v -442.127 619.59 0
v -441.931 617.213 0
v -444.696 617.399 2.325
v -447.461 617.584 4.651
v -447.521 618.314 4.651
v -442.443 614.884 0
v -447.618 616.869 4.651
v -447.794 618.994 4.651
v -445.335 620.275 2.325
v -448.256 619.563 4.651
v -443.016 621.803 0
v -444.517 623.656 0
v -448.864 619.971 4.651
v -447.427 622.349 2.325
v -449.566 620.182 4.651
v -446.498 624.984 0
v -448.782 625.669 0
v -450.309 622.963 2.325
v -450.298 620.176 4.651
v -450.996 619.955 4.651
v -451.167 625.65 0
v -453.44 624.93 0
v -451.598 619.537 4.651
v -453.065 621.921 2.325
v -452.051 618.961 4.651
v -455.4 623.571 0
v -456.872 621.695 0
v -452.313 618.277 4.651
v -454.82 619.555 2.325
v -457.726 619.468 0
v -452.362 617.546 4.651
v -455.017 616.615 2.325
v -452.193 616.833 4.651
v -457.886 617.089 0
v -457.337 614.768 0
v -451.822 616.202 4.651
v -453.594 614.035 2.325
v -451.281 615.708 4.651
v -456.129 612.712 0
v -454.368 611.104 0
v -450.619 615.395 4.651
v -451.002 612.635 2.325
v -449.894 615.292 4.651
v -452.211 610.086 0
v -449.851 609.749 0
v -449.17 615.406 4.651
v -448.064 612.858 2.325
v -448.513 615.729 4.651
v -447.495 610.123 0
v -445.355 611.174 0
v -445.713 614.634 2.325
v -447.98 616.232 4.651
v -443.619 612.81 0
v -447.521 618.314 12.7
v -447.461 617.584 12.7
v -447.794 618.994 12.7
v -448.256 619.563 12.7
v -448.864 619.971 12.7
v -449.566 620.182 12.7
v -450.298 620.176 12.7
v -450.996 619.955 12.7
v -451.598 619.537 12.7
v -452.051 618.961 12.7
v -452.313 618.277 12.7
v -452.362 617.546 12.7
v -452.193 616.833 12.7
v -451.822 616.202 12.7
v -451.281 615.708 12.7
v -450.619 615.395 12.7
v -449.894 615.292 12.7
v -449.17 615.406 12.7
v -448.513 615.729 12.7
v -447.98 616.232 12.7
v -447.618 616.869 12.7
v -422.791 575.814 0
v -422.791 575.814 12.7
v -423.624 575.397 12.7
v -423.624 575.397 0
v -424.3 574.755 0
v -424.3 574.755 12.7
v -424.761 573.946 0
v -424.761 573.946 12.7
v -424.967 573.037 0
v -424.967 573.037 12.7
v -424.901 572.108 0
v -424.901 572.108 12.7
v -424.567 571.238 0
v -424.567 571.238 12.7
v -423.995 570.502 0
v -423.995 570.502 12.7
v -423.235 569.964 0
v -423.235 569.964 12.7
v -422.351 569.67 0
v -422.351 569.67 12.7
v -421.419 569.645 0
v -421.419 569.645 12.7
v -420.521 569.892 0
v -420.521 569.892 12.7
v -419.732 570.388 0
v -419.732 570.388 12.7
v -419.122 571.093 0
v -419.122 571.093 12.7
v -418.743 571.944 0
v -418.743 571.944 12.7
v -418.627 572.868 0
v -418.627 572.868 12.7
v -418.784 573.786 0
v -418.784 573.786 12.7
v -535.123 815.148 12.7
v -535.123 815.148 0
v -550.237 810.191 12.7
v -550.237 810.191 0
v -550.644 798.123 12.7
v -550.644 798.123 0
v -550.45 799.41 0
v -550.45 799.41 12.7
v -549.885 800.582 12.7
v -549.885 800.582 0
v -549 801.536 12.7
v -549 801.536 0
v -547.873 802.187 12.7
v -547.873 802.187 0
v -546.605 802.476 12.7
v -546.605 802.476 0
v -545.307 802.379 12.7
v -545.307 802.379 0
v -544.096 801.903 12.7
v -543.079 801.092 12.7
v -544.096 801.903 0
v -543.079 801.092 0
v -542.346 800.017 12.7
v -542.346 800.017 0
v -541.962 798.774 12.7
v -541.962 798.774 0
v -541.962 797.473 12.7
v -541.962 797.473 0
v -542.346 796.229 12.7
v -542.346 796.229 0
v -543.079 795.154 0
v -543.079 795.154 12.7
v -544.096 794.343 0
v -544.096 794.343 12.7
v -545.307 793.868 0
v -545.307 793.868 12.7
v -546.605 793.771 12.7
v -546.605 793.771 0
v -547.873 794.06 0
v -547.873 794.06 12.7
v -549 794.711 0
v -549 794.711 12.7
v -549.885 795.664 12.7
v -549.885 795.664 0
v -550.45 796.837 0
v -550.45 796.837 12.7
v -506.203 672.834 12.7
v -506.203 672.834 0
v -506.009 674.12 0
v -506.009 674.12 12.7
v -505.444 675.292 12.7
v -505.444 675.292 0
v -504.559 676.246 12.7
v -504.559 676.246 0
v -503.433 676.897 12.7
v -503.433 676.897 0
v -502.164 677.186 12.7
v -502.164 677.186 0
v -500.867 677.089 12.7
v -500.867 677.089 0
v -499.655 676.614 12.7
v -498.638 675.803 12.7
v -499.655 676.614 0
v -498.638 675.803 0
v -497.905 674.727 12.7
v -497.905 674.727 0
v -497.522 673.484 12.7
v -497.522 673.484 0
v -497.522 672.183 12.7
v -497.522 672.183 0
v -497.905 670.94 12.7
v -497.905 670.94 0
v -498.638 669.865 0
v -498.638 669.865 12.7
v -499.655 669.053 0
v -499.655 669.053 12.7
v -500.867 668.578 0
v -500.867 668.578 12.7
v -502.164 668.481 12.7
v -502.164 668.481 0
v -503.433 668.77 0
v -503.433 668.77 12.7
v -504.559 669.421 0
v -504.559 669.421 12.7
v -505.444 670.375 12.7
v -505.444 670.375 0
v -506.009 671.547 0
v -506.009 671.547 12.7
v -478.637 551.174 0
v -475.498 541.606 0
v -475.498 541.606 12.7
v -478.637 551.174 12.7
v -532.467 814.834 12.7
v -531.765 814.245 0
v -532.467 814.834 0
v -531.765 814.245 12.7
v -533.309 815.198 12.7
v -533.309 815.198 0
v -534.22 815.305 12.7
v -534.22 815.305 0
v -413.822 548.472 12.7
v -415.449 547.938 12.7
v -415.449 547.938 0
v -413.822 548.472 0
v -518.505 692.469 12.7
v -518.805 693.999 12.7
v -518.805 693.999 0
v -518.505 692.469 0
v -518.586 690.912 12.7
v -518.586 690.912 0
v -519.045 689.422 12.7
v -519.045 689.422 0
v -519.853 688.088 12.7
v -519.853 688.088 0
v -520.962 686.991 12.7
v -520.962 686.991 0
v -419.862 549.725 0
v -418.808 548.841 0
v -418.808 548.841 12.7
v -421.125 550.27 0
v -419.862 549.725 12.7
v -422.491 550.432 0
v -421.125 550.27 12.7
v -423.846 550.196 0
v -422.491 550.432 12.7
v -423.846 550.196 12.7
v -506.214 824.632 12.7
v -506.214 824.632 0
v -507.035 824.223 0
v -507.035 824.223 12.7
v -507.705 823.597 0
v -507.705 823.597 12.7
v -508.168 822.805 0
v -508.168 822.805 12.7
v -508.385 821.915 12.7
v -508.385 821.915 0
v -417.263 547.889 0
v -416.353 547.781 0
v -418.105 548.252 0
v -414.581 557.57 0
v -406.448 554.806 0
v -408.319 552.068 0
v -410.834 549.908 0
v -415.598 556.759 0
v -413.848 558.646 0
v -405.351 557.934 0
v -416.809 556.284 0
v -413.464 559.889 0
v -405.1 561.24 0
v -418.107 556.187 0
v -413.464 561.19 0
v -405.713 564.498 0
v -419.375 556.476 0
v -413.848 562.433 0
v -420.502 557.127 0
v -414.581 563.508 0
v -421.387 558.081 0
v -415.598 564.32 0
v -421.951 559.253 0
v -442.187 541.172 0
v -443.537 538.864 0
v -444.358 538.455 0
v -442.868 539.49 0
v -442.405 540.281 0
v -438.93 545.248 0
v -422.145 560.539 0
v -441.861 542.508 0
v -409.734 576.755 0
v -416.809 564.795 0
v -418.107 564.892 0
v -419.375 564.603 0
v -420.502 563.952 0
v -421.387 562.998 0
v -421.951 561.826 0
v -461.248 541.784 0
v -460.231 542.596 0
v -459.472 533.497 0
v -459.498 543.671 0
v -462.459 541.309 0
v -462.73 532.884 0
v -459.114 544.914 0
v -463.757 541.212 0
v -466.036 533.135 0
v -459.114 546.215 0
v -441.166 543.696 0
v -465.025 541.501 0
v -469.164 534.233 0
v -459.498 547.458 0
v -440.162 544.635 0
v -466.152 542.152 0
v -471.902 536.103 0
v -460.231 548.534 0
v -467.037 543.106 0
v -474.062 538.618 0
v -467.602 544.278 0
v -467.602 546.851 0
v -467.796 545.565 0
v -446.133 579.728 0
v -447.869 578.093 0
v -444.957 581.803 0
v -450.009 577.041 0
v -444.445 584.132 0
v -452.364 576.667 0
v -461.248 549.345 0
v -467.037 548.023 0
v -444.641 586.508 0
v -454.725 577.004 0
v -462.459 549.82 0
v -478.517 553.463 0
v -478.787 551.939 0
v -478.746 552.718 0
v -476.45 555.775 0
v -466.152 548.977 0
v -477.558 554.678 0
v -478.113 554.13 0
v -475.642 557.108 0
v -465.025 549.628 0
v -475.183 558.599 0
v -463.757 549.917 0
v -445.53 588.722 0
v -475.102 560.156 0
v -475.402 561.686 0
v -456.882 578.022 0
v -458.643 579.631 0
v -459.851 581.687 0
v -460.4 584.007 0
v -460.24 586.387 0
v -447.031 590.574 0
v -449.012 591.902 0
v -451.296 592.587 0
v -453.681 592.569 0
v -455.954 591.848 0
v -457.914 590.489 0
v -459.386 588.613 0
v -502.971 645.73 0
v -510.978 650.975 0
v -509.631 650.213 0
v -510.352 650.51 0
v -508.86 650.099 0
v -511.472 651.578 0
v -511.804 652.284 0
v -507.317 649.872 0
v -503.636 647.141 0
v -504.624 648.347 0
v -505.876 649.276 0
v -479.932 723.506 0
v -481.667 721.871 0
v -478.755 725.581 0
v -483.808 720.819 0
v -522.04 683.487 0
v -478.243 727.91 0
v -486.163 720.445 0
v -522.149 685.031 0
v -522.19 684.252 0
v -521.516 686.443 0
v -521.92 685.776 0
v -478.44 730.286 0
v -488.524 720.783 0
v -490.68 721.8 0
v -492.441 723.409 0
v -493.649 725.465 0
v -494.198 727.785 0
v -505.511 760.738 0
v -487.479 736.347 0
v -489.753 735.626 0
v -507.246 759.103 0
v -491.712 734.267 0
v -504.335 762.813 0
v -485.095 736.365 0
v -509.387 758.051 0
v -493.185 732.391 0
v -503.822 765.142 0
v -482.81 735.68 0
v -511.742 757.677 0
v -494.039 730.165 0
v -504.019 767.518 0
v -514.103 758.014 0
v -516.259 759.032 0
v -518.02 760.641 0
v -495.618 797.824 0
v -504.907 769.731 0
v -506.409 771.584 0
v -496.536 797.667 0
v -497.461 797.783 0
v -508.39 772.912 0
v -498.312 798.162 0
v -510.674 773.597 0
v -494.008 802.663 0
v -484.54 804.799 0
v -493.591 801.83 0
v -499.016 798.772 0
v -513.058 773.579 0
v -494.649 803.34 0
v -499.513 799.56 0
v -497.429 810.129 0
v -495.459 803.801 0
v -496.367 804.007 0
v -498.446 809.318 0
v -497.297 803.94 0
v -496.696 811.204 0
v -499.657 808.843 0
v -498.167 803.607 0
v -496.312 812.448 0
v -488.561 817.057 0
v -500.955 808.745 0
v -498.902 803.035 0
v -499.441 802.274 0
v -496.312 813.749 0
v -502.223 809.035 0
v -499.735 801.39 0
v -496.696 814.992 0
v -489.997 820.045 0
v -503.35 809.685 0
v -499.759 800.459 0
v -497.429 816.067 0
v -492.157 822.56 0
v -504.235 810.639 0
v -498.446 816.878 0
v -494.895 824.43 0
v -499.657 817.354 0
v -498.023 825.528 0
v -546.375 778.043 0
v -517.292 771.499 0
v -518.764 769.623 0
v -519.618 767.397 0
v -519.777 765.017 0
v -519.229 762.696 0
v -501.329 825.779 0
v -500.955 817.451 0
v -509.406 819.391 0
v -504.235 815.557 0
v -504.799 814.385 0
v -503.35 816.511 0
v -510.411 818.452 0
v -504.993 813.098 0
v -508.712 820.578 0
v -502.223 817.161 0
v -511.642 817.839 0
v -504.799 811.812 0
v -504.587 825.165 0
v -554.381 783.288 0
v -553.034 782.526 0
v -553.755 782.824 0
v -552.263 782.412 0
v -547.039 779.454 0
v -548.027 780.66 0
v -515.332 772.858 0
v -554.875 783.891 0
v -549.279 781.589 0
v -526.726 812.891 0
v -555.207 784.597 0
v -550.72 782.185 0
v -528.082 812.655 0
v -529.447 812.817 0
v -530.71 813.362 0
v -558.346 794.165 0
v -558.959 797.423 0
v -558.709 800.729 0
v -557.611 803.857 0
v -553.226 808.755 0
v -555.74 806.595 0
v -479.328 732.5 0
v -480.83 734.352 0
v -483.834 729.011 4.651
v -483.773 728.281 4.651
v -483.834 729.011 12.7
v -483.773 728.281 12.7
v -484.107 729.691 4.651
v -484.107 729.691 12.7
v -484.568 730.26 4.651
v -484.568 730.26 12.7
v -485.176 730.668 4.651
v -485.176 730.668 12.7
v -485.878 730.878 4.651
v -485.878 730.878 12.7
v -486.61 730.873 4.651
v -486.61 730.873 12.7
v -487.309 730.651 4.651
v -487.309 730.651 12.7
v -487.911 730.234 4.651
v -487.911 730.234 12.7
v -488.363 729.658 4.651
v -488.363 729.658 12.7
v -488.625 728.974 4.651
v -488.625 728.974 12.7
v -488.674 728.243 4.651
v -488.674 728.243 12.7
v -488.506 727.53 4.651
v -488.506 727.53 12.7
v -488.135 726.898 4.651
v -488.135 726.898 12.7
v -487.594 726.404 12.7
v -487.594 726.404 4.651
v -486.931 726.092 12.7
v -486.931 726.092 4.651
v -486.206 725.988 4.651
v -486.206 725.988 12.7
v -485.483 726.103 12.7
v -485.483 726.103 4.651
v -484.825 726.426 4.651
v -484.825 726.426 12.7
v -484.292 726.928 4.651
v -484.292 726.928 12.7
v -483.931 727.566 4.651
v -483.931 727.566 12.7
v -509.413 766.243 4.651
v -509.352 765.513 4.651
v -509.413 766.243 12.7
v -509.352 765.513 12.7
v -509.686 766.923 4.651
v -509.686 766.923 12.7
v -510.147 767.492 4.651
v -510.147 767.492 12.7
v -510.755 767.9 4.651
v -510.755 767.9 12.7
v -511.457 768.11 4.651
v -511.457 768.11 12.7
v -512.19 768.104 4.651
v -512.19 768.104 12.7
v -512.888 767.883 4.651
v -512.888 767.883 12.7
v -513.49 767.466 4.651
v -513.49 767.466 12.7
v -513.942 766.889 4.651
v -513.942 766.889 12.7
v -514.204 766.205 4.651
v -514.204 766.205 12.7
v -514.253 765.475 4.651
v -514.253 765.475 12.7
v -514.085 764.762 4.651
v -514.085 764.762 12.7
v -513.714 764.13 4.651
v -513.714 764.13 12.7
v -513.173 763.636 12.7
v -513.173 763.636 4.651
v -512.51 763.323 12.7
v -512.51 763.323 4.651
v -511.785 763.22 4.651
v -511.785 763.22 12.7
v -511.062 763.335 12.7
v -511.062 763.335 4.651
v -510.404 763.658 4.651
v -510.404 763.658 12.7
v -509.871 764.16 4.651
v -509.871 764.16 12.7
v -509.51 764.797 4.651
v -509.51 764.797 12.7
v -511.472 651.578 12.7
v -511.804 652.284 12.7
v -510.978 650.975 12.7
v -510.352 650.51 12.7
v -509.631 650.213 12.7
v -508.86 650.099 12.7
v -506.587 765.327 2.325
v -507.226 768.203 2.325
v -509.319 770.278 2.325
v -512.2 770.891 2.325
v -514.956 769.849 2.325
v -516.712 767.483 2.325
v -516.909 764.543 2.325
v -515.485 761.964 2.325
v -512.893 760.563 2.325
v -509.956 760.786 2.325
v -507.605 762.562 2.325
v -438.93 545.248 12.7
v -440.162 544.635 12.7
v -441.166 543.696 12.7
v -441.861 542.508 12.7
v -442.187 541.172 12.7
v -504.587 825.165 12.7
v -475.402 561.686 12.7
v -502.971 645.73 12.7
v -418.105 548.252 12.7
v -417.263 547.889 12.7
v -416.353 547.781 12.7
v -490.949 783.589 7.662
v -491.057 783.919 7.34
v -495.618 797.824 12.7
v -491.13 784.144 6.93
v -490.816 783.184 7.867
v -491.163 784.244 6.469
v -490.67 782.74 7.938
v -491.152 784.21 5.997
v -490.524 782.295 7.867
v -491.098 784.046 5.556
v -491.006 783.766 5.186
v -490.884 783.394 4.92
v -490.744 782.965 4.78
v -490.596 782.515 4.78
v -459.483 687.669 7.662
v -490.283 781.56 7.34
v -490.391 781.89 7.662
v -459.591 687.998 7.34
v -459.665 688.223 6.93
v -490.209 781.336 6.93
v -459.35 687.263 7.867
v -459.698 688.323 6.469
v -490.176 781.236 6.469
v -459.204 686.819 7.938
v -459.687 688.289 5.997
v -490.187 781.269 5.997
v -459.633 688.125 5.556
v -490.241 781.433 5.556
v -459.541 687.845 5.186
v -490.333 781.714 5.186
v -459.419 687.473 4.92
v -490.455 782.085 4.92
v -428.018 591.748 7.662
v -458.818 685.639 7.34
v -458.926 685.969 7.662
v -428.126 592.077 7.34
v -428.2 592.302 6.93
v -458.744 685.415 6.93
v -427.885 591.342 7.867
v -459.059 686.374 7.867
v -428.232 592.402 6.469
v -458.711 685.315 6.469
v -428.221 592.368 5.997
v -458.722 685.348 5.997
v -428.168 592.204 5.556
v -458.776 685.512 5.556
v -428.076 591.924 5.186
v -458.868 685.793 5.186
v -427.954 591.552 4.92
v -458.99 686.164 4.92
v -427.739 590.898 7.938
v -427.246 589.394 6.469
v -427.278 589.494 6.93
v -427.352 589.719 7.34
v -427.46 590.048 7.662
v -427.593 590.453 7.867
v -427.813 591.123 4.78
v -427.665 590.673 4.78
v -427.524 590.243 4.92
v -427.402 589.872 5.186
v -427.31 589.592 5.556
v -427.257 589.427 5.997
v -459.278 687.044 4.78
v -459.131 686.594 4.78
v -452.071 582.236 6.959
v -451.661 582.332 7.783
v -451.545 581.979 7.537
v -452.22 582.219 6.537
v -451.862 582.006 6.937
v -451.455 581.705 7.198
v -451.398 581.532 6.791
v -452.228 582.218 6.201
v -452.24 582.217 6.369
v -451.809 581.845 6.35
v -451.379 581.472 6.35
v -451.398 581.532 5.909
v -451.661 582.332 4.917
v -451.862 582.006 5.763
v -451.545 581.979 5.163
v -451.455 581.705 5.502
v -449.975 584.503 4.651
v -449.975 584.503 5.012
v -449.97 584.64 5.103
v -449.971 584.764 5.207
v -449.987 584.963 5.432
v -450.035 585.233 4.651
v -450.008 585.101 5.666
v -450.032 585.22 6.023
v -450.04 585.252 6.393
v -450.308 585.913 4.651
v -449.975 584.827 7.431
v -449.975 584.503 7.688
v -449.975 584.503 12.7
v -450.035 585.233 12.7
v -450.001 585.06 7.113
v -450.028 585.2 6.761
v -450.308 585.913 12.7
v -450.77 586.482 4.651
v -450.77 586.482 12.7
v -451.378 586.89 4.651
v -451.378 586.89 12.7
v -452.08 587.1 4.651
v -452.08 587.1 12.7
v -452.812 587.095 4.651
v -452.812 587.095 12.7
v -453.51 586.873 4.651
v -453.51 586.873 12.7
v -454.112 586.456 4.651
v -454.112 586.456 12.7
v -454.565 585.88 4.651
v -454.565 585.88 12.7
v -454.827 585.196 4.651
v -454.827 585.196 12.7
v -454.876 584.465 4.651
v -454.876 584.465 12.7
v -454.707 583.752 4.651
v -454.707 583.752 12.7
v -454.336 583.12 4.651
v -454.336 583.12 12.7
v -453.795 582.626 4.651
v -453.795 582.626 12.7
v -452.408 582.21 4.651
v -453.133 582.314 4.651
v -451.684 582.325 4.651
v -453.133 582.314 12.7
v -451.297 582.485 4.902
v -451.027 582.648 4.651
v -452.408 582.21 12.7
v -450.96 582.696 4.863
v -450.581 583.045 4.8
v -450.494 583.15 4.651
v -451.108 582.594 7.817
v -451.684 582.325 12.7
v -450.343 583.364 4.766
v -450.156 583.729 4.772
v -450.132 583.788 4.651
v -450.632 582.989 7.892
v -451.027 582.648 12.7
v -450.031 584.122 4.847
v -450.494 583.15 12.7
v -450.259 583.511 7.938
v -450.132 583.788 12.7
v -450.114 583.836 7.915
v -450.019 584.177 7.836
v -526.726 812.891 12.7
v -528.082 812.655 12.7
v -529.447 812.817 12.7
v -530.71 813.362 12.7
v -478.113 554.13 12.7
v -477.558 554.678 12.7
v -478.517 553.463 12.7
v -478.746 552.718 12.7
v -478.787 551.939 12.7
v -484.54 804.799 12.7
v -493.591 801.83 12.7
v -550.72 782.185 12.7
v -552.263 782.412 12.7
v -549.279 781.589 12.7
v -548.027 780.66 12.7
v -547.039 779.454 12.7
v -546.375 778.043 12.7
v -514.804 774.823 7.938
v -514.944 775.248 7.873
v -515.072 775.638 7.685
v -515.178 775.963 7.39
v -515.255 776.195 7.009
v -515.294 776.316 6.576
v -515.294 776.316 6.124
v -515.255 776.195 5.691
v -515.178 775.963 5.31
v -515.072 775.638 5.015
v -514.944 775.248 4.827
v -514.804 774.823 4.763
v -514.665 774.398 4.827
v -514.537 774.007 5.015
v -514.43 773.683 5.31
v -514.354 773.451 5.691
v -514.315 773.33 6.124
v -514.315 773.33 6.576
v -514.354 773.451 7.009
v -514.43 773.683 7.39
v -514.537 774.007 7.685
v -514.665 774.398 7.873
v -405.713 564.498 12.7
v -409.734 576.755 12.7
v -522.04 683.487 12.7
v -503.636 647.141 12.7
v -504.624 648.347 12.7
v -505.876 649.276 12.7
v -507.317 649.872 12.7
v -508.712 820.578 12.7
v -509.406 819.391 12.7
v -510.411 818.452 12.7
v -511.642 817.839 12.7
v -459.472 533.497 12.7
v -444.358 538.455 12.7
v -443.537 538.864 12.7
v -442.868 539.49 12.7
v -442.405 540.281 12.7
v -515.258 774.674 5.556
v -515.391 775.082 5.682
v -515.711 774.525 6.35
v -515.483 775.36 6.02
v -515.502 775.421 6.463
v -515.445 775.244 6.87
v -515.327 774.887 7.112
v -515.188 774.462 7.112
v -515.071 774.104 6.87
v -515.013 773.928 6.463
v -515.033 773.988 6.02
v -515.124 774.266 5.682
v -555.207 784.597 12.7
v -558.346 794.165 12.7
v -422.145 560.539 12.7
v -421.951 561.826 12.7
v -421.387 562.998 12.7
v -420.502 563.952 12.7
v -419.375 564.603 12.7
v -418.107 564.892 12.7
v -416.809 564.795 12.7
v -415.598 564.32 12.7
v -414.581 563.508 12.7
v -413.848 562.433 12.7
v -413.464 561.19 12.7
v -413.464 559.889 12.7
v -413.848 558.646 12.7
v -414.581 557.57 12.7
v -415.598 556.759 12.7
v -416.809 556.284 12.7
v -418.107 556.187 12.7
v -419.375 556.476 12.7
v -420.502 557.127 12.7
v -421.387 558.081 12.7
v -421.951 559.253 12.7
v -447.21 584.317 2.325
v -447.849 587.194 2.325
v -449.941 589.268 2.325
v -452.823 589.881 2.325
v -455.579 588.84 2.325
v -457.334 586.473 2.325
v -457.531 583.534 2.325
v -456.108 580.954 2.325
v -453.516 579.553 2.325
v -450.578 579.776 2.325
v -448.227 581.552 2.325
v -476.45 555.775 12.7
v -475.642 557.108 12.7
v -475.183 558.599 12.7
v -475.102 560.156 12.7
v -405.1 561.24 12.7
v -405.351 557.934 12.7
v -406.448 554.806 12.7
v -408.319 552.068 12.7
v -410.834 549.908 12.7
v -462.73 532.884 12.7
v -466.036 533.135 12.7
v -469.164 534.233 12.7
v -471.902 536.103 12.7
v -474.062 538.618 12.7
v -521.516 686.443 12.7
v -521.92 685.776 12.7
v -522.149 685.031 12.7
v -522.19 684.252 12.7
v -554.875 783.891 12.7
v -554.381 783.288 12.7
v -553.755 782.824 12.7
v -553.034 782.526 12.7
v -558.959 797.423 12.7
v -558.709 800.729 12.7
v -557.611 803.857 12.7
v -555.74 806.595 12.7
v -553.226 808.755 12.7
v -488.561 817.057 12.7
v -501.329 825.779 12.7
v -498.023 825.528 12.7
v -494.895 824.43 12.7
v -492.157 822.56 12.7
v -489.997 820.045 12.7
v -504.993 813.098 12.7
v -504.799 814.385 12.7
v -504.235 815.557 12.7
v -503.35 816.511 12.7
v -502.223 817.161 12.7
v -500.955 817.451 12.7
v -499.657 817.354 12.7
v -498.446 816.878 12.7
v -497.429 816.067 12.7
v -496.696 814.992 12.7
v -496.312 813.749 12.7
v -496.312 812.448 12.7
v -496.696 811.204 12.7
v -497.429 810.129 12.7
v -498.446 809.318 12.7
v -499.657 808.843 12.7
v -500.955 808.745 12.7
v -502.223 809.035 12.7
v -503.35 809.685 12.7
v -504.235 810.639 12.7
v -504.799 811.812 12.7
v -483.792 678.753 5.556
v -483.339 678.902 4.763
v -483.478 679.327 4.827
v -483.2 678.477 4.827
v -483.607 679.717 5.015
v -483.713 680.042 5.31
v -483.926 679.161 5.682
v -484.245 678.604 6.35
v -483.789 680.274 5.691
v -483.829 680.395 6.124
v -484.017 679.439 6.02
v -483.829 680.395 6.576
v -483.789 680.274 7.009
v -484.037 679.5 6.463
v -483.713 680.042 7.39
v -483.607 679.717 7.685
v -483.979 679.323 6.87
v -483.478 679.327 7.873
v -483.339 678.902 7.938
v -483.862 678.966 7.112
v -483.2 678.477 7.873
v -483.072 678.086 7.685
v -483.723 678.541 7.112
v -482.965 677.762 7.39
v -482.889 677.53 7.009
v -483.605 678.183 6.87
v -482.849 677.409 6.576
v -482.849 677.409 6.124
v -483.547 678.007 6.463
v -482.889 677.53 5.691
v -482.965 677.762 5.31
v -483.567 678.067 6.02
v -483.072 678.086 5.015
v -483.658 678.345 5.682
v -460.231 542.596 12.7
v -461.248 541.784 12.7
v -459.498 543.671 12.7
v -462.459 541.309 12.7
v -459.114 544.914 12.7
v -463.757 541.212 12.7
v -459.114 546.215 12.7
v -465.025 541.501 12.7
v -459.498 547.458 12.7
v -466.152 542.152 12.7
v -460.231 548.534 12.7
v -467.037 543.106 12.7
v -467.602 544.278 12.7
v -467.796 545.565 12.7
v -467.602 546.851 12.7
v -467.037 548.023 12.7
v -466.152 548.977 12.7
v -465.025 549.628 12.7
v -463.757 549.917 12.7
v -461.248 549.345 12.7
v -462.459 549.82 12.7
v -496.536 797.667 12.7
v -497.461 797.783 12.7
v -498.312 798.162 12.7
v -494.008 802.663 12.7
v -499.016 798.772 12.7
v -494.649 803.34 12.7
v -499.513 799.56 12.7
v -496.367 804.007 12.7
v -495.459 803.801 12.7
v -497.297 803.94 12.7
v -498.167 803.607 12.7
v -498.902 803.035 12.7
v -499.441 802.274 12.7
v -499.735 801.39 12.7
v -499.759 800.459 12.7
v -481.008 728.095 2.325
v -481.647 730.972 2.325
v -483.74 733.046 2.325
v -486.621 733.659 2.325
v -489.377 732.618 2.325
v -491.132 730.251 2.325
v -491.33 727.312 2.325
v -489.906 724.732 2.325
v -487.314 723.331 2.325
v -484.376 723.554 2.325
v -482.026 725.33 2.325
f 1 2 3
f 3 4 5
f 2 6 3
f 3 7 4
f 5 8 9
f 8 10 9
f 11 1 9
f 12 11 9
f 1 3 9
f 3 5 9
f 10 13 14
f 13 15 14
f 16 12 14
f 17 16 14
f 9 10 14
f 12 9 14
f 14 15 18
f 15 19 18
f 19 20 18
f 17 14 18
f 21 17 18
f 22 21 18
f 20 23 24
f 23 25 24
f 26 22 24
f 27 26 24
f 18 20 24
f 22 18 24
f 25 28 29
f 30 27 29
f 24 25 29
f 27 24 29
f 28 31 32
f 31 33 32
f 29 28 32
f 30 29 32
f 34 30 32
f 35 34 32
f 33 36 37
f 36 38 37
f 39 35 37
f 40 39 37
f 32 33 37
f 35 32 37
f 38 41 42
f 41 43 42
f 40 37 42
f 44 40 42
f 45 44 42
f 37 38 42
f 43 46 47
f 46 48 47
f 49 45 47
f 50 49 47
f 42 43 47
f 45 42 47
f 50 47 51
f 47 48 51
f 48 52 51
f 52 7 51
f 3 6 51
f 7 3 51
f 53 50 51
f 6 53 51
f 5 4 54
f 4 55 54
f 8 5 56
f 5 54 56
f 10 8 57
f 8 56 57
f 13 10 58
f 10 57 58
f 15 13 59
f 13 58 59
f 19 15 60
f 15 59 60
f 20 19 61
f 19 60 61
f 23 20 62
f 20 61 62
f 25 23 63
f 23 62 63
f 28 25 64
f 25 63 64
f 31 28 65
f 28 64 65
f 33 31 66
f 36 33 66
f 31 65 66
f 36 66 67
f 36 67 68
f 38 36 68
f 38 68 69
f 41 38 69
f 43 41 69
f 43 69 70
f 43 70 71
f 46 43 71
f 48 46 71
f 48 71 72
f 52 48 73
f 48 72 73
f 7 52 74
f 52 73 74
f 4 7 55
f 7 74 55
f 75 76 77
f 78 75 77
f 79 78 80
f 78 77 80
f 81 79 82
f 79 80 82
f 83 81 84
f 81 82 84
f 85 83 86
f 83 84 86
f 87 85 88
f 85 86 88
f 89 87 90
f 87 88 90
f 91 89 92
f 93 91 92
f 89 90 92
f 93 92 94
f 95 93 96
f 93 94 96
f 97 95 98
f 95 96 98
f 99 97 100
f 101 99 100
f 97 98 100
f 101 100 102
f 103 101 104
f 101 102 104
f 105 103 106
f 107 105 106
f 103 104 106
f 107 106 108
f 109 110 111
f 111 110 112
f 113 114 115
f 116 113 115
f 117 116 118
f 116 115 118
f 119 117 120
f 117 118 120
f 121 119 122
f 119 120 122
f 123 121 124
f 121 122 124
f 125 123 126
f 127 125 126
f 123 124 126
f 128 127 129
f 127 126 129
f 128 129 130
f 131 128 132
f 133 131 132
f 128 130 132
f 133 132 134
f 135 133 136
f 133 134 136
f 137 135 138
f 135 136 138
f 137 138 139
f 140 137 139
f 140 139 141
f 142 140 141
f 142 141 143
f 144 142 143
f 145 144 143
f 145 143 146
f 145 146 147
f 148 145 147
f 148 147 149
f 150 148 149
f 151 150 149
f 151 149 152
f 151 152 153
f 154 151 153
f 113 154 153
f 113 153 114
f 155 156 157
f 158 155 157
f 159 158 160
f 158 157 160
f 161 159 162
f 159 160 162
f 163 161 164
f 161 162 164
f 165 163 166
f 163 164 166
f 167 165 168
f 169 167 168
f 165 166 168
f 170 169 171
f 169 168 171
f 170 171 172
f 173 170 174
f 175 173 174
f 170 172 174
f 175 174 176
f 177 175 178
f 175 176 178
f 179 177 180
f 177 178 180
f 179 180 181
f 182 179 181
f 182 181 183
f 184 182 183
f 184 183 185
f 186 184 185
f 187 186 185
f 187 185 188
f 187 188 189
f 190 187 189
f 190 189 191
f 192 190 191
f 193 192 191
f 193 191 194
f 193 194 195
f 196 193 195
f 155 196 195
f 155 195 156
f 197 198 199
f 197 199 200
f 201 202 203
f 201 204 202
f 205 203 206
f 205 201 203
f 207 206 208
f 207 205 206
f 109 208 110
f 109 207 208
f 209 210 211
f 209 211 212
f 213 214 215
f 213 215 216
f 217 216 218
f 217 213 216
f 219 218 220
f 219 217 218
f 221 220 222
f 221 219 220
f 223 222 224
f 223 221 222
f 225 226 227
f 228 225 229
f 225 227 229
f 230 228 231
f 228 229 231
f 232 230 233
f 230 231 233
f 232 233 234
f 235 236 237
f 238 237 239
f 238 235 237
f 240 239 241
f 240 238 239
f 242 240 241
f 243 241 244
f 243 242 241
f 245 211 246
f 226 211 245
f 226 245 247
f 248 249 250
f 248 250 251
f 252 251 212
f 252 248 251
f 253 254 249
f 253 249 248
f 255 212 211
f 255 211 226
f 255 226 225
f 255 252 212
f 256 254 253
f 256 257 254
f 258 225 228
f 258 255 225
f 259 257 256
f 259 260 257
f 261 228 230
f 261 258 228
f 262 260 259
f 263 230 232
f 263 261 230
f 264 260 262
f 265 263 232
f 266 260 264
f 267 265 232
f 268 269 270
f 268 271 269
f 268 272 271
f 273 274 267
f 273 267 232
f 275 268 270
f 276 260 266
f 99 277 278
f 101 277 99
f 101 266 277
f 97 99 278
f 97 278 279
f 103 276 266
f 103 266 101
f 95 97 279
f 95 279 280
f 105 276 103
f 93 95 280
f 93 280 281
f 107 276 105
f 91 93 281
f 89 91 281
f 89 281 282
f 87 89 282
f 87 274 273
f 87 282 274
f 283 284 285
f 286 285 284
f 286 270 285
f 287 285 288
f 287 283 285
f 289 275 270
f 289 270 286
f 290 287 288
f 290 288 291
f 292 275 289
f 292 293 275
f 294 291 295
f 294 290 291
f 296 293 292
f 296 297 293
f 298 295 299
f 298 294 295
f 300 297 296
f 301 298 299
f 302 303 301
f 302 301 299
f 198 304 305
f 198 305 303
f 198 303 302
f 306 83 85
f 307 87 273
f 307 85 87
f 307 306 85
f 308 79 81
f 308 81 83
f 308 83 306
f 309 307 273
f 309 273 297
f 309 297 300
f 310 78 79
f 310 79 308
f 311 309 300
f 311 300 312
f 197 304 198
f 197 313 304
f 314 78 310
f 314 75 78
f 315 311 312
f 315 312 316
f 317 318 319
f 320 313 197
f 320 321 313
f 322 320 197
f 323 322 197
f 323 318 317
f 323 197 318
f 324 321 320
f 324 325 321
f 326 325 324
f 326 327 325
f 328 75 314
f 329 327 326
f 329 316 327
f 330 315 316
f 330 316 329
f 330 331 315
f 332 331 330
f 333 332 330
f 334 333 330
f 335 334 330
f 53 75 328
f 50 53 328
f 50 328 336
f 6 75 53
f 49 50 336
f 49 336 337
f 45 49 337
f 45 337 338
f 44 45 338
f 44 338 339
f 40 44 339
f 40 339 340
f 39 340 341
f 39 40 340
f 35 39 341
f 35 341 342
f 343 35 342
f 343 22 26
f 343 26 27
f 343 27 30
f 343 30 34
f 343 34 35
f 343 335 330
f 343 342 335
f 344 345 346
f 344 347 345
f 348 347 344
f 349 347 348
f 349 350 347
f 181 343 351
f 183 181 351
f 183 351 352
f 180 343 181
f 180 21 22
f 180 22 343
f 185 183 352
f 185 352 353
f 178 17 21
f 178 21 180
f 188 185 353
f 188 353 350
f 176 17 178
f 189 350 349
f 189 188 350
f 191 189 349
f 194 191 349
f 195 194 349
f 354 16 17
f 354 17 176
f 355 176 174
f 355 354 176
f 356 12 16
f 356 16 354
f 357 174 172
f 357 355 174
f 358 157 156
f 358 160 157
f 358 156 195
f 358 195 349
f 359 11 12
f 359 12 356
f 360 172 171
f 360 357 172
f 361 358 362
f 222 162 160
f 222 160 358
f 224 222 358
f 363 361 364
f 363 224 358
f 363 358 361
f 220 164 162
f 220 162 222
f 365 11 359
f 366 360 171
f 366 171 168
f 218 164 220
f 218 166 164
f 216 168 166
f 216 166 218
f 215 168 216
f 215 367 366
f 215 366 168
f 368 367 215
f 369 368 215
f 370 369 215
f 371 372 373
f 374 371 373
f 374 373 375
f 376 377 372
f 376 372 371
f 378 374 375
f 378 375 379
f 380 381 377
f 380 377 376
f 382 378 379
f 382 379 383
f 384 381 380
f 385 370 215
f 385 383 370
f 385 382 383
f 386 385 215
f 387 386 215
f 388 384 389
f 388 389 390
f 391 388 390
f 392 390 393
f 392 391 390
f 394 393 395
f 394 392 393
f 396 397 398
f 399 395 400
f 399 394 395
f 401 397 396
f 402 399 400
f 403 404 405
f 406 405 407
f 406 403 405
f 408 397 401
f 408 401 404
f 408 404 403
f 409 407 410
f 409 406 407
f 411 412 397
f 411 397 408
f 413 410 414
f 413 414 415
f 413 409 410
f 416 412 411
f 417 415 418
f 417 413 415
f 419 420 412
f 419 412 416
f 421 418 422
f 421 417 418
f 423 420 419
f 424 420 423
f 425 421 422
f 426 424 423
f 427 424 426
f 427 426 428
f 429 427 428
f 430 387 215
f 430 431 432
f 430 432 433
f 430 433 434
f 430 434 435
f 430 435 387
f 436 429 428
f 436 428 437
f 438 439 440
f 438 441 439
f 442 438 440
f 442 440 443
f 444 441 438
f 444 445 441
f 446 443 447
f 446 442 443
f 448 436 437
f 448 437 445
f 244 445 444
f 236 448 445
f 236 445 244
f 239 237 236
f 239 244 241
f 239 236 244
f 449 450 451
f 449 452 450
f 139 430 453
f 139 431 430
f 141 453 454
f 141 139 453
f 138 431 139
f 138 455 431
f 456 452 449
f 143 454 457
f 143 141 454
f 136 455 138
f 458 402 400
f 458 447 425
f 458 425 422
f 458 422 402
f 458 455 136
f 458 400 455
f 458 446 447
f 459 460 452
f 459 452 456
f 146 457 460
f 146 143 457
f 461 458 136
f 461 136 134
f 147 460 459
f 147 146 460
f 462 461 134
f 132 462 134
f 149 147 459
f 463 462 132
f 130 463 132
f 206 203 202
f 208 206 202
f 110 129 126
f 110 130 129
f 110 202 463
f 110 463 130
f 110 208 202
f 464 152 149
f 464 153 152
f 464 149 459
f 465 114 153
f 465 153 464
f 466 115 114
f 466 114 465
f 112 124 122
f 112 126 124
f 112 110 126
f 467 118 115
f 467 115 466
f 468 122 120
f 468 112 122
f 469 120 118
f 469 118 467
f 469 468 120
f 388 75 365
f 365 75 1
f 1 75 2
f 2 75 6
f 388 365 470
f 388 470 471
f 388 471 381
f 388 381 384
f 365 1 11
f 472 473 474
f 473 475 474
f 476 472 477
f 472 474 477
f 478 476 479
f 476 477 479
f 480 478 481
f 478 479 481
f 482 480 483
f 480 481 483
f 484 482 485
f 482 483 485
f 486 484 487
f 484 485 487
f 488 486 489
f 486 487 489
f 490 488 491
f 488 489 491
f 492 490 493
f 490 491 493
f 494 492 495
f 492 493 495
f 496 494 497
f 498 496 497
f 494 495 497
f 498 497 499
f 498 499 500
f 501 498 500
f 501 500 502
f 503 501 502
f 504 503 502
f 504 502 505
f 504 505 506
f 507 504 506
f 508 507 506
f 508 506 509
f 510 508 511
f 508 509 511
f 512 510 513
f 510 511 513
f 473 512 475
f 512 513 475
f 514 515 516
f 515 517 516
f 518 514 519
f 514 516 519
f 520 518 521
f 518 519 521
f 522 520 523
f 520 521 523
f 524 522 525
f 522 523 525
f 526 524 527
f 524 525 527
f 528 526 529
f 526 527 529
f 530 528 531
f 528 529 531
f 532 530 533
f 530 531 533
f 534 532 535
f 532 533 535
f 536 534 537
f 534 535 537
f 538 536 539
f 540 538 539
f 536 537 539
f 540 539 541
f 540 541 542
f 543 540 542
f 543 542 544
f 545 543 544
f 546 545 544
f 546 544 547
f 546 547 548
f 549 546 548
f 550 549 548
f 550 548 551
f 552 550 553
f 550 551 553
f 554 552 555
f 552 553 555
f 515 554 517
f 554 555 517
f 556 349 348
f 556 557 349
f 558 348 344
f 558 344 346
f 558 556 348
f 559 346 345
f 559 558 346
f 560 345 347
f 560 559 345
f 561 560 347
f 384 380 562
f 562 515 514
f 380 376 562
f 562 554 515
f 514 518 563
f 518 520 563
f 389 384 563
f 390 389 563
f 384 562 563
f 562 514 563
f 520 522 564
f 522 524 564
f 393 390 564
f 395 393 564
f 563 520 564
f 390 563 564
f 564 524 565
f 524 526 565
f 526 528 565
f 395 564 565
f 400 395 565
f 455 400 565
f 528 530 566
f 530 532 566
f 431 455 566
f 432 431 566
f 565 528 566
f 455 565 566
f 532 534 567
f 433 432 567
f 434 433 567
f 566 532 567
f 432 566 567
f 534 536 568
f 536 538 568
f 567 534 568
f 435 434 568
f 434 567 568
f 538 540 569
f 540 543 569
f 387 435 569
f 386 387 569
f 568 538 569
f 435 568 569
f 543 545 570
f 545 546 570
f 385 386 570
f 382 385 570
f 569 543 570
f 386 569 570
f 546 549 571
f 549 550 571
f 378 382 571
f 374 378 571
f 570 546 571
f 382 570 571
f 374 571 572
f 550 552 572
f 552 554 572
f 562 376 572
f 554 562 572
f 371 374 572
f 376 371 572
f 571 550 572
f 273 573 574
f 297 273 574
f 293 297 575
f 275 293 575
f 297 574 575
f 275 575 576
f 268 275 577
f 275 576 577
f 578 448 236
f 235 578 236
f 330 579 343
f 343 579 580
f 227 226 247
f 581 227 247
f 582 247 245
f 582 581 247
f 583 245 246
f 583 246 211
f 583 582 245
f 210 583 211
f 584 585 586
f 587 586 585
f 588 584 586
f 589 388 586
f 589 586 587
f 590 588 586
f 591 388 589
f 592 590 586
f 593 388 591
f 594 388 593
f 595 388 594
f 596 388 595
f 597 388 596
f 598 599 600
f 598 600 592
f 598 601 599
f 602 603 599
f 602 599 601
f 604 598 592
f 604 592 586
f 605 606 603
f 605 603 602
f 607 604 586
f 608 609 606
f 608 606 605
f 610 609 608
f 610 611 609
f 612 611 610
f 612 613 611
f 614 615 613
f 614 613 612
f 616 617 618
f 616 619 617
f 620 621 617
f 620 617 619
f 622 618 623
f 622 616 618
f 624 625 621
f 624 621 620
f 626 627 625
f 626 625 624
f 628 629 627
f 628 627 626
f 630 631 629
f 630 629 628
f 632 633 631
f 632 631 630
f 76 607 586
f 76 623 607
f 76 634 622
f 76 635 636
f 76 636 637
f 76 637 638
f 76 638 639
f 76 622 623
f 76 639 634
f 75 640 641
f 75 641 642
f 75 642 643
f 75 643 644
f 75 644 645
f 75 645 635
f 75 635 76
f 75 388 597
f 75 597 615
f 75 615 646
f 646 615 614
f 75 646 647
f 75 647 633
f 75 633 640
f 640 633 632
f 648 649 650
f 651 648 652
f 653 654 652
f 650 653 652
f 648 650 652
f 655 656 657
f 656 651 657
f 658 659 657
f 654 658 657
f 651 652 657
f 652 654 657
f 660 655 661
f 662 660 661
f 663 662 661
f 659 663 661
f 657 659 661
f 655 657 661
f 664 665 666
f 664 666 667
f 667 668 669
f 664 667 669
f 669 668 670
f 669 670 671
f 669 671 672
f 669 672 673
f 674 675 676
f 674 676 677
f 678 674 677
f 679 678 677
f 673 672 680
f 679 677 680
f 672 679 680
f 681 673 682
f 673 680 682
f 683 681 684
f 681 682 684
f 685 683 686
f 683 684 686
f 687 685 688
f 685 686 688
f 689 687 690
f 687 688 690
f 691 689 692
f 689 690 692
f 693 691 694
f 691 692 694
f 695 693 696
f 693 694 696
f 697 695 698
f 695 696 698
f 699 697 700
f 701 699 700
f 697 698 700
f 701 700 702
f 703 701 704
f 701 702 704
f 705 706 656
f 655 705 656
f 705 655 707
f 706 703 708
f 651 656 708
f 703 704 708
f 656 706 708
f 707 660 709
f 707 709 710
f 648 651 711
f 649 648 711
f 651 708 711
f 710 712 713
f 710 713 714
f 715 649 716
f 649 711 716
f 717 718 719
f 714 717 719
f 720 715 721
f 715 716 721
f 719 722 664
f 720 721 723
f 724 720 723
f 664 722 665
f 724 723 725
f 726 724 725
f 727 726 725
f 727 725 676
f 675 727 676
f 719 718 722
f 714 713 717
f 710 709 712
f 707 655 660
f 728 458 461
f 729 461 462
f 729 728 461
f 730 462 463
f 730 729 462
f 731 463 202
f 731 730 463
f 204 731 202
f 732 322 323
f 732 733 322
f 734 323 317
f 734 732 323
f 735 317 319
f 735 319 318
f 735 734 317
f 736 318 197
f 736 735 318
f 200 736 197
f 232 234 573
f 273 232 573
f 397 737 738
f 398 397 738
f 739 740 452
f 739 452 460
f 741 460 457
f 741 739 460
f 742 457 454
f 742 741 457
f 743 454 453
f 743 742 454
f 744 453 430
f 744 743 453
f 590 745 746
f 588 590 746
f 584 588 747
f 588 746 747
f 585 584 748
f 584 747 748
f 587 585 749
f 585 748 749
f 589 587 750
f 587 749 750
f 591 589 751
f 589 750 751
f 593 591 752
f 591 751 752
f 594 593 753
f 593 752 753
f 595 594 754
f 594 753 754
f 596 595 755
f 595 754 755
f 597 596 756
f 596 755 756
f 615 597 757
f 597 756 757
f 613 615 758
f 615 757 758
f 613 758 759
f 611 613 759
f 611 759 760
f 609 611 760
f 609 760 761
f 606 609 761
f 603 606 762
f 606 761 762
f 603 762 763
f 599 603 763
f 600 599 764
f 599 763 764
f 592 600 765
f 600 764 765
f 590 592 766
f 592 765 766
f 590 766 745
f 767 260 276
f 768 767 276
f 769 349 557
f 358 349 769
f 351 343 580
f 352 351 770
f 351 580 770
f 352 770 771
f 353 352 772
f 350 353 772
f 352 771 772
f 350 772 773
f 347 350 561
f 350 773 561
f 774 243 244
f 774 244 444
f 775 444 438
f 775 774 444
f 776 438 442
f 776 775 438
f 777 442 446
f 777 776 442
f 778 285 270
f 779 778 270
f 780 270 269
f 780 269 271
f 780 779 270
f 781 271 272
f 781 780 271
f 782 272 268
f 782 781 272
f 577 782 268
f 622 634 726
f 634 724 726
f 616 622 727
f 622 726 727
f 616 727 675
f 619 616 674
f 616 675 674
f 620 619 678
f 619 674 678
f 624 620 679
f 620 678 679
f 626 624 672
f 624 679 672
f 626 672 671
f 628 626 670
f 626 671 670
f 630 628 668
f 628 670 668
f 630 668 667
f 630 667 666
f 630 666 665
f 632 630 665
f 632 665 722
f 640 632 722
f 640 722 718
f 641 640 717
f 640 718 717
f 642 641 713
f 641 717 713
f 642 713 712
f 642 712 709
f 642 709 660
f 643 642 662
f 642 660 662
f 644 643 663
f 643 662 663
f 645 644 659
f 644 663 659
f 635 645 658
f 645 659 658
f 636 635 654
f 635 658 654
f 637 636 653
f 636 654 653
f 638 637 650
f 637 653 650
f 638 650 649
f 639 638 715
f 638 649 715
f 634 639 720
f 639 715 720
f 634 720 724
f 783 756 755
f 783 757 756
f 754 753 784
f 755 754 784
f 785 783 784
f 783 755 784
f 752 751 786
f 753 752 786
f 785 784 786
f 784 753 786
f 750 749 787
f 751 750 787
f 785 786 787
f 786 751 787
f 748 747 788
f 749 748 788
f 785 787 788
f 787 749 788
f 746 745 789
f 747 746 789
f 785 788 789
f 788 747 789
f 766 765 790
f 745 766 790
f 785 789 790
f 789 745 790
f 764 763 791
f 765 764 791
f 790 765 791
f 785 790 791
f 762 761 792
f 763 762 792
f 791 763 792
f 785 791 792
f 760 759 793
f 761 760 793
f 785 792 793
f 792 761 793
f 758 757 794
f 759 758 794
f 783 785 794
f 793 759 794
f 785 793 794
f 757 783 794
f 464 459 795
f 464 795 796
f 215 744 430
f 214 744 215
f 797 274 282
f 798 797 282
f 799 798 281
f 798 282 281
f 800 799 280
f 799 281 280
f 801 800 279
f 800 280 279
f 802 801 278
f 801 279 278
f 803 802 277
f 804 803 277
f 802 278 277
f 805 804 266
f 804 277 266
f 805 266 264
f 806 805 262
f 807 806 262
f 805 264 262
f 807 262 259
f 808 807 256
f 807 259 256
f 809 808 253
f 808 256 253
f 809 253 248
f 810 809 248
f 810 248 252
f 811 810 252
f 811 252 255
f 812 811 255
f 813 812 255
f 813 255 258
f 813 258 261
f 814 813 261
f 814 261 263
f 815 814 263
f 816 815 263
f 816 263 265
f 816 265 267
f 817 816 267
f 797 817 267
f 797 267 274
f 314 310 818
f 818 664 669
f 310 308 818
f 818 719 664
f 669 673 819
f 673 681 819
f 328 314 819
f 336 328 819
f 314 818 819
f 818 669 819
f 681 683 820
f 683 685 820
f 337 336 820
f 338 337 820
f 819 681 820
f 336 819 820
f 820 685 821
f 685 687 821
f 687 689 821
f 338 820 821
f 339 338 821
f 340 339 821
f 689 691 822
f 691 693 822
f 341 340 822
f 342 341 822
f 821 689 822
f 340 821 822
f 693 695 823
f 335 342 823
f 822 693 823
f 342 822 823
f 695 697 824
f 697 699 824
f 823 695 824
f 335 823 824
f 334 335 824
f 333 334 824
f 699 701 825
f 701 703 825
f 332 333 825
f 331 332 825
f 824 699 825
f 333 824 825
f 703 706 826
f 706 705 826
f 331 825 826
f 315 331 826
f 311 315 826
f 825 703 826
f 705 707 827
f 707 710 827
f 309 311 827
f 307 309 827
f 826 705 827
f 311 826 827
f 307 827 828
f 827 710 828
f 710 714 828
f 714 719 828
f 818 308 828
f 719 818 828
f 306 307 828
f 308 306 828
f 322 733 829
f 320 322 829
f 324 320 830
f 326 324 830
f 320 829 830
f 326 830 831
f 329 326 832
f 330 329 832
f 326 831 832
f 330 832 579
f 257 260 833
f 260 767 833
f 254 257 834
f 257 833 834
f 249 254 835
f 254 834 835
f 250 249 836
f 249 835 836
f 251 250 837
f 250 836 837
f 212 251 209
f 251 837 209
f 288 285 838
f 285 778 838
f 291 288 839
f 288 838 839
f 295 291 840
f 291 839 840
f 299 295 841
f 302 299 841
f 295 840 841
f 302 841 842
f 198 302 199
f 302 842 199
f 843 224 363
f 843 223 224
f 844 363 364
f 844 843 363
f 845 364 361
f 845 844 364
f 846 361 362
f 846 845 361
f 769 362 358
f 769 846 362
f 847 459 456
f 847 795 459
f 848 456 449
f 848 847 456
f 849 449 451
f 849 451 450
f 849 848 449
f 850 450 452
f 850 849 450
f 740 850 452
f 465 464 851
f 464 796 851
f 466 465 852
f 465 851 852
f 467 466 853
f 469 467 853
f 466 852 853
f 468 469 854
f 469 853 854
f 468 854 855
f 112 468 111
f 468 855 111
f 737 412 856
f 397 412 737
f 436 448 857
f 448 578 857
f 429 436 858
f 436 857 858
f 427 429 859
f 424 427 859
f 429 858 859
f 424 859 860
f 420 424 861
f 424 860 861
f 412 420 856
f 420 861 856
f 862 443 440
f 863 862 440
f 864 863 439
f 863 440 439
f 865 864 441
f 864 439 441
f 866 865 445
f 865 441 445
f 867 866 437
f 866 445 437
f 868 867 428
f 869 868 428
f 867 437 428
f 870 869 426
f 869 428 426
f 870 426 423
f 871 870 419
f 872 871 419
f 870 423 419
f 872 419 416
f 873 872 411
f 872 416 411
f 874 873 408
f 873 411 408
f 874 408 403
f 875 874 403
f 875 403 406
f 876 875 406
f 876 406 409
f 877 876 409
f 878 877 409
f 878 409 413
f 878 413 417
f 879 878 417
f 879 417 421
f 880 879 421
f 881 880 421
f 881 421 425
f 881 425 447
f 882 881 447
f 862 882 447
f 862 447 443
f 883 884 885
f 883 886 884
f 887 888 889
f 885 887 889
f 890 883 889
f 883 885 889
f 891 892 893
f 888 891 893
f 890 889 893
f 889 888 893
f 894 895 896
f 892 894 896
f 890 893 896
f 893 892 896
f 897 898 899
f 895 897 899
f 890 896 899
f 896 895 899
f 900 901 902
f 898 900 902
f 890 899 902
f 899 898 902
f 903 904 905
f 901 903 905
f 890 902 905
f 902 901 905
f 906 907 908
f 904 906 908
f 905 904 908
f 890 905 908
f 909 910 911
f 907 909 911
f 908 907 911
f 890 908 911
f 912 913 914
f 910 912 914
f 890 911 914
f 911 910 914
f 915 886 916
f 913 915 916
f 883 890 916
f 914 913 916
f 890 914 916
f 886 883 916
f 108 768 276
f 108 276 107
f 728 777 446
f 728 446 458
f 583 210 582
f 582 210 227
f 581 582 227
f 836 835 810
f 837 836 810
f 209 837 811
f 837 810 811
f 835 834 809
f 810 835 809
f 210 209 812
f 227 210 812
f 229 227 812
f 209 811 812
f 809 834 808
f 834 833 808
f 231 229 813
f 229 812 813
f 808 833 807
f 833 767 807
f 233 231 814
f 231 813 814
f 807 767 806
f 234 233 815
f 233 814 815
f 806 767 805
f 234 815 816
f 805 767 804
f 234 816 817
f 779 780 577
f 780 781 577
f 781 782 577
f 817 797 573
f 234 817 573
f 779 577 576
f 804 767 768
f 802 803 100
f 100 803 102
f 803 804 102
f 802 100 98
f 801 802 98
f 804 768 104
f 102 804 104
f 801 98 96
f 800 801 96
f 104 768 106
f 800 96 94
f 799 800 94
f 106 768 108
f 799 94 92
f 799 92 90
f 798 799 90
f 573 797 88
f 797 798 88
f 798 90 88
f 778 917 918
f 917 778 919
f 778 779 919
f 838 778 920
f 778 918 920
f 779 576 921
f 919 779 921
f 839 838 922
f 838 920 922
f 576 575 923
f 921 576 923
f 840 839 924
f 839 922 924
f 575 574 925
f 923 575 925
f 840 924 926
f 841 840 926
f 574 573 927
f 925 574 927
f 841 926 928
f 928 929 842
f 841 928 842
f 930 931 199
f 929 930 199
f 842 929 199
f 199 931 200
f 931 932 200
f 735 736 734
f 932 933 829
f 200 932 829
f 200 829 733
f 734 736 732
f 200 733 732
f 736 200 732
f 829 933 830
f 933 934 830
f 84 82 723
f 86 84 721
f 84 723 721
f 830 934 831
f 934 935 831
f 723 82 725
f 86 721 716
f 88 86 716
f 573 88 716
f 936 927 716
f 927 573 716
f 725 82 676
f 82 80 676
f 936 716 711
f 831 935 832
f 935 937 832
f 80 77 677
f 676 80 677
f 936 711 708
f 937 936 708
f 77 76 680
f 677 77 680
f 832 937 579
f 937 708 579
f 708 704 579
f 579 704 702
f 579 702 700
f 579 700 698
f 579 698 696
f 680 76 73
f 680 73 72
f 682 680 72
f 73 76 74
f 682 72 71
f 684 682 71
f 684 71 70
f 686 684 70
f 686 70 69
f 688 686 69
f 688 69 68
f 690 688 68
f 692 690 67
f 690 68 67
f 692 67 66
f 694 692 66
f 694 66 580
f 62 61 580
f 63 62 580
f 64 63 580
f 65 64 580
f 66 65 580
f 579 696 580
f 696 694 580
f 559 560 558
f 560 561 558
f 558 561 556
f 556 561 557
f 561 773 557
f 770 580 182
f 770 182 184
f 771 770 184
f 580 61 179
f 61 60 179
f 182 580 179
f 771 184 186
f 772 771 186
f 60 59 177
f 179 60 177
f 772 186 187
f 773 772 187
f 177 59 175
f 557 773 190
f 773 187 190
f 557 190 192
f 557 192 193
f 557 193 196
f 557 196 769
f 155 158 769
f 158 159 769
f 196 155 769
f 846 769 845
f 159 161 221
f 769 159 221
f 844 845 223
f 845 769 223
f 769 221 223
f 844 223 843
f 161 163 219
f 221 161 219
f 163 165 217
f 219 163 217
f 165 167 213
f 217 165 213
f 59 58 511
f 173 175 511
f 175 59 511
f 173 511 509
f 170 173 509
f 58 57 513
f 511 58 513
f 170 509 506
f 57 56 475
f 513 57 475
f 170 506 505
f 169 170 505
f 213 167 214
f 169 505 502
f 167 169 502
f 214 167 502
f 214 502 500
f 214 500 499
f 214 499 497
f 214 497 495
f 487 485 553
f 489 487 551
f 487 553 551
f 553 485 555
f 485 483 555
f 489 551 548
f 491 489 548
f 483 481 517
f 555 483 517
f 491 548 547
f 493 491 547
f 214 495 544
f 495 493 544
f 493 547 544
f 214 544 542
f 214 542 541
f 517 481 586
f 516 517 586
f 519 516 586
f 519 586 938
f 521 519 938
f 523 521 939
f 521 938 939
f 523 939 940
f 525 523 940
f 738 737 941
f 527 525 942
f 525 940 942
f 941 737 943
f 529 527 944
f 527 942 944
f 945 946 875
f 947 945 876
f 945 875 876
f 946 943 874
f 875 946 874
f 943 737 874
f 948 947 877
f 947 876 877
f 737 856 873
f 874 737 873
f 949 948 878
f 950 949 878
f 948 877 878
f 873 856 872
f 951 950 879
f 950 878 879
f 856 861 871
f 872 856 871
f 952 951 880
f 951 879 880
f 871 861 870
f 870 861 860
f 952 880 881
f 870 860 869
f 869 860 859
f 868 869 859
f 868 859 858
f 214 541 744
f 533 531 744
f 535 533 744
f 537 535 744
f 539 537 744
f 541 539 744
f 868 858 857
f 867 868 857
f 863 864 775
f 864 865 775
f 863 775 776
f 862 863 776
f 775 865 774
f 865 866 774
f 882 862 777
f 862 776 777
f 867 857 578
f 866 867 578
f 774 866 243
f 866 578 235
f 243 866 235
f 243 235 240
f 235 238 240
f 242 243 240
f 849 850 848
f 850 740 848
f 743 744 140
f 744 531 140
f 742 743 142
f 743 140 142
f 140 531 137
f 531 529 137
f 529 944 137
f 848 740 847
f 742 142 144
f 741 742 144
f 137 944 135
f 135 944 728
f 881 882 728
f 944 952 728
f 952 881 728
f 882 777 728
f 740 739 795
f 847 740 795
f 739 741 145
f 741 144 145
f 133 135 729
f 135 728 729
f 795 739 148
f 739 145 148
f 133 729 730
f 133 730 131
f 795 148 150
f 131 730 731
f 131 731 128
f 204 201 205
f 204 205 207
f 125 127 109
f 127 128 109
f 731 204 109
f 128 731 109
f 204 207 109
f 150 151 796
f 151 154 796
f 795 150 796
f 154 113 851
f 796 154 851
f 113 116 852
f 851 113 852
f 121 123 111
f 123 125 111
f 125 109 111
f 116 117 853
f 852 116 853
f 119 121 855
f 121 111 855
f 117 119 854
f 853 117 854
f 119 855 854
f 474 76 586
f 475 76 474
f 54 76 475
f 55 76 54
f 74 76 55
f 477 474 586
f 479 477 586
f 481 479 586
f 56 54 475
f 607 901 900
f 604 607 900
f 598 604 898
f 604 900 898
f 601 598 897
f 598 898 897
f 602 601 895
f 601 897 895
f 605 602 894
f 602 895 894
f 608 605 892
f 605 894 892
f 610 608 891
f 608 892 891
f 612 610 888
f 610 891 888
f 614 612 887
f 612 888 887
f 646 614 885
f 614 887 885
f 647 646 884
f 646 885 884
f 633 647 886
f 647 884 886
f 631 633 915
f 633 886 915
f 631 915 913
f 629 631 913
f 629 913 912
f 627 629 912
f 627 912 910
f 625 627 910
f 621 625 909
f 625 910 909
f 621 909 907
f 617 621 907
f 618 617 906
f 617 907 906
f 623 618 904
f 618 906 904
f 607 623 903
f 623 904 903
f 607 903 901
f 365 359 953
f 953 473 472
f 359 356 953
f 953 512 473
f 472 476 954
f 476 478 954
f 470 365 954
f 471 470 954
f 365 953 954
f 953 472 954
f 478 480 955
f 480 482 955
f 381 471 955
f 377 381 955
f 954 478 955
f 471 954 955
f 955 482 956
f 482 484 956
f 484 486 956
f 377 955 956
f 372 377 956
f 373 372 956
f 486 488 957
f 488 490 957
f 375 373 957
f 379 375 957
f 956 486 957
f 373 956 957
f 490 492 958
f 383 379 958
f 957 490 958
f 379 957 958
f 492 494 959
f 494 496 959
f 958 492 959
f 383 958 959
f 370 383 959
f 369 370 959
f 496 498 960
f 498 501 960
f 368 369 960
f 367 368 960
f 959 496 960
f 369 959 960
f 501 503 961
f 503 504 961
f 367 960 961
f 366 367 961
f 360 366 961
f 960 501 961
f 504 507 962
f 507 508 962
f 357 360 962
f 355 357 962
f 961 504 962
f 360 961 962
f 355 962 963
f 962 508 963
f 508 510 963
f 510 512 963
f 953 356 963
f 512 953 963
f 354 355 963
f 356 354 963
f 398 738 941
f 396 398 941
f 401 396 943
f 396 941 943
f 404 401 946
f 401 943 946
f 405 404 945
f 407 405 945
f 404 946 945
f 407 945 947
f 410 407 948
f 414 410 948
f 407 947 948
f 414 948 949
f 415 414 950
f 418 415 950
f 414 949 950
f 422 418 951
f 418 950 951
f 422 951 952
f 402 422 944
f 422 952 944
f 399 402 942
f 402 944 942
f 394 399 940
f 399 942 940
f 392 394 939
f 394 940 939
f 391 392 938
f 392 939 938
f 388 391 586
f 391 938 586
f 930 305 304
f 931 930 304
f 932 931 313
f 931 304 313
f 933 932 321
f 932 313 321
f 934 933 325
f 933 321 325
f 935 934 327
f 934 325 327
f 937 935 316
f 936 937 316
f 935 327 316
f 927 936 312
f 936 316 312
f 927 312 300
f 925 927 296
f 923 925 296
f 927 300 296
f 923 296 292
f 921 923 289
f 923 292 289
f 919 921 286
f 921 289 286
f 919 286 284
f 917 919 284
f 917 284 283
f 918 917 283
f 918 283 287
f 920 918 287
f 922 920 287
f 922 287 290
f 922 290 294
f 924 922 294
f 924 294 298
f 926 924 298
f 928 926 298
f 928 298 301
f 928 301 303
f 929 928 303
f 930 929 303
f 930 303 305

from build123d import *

# Parameters (mm, degrees)
BOSS_EXTRUDE1_DEPTH                               = 12.7
FILLET1_R                                         = 12.7
F_1_4_0_25_DIAMETER_HOLE1_D                       = 6.35
HOLE1_D                                           = 3.175
HOLE1_DEPTH                                       = 38.1
HOLE1_CSINK_D                                     = 10.16
HOLE1_CSINK_ANGLE                                 = 82
HOLE1_TIP                                         = 0.9538662327062519
F_5_16_CLEARANCE_HOLE1_D                          = 8.72998
CUT_EXTRUDE1_DEPTH                                = 998.2767957894854
FILLET2_R                                         = 3.175
CSK_FOR_8_FLAT_HEAD_MACHINE_SCREW_100_D           = 4.9149
CSK_FOR_8_FLAT_HEAD_MACHINE_SCREW_100_DEPTH       = 22.225
CSK_FOR_8_FLAT_HEAD_MACHINE_SCREW_100_CSINK_D     = 16.0004506
CSK_FOR_8_FLAT_HEAD_MACHINE_SCREW_100_CSINK_ANGLE = 100
CSK_FOR_8_FLAT_HEAD_MACHINE_SCREW_100_TIP         = 1.476584928229278


with BuildPart() as part:
    # Sketch1 → Boss-Extrude1 (new body)
    with BuildSketch(Plane.XY):
        Polygon((-504.586893891522, 825.1654748045078), (-413.82187552728277, 548.4721148571872), (-471.5394528912339, 529.5387477161187), (-562.3044712554732, 806.2321076634394), align=None)
        Polygon((-421.80123191535296, 572.7968488683923), (-413.82187552728277, 548.4721148571872), (-401.754552912923, 552.4306151945574), (-409.7339093009929, 576.7553492057625), align=None)
        Polygon((-504.586893891522, 825.1654748045078), (-492.51957127716224, 829.123975141878), (-484.5402148890918, 804.7992411306724), (-496.6075375034517, 800.8407407933022), align=None)
    extrude(amount=BOSS_EXTRUDE1_DEPTH)

    # Fillet1
    fillet1_edges = [part.edges().sort_by_distance(p)[0] for p in [
        (-401.754552912923, 552.4306151945574, 6.35),
        (-471.5394528912339, 529.5387477161187, 6.35),
        (-562.3044712554732, 806.2321076634394, 6.35),
        (-492.51957127716224, 829.123975141878, 6.35),
    ]]
    fillet(fillet1_edges, radius=FILLET1_R)

    # 1/4 (0.25) Diameter Hole1 (through all)
    with Locations(Plane(origin=(0, 0, 0), x_dir=(-1, 0, 0), z_dir=(0, 0, -1))):
        with Locations((496.607537503, 800.840740793), (421.801231915, 572.796848868)):
            Hole(F_1_4_0_25_DIAMETER_HOLE1_D / 2)

    # Hole1
    with Locations(Plane(origin=(-72.82198225638447, -450.30656055117834, -91.0749999969487), x_dir=(-4.8e-16, -1.6e-16, -1), z_dir=(0.9501828830204595, 0.3116929399504066, 0))):
        with Locations((-97.424999997, 1099.959715498), (-97.424999997, 1301.859715498), (-97.424999997, 1200.909715498)):
            CounterSinkHole(HOLE1_D / 2, HOLE1_CSINK_D / 2, depth=HOLE1_DEPTH, counter_sink_angle=HOLE1_CSINK_ANGLE)
            with Locations((0, 0, -(HOLE1_DEPTH + HOLE1_TIP / 2))):  # 118° drill point
                Cone(0, HOLE1_D / 2, HOLE1_TIP, mode=Mode.SUBTRACT)

    # 5/16 Clearance Hole1 (through all)
    with Locations(Plane.XY.offset(12.7)):
        with Locations((-546.278648304, 798.123285386), (-500.628393554, 813.09815219), (-463.430630614, 545.564570668), (-417.780375865, 560.539437472), (-501.837808805, 672.833553111)):
            Hole(F_5_16_CLEARANCE_HOLE1_D / 2)

    # Sketch9 → Cut-Extrude1 (cut, through all)
    with BuildSketch(Plane.XY.offset(12.7)):
        with BuildLine():
            Line((-529.6953014924577, 821.9412393048426), (-514.6111482245083, 826.8893647265553))
            ThreePointArc((-514.6111482245083, 826.8893647265553), (-508.60146461760905, 823.8485563726845), (-511.6422729714802, 817.838872765785))
            Line((-511.6422729714802, 817.838872765785), (-526.72642623943, 812.8907473440726))
            ThreePointArc((-526.72642623943, 812.8907473440726), (-532.7361098463288, 815.9315556979438), (-529.6953014924577, 821.9412393048426))
        make_face()
        with BuildLine():
            Line((-546.3745591048678, 778.043051296225), (-518.8053014409139, 693.9993230871839))
            ThreePointArc((-518.8053014409139, 693.9993230871839), (-522.8597125794092, 685.9864116113188), (-530.8726240552741, 690.0408227498137))
            Line((-530.8726240552741, 690.0408227498137), (-558.4418817192275, 774.084550958855))
            ThreePointArc((-558.4418817192275, 774.084550958855), (-554.3874705807326, 782.0974624347199), (-546.3745591048678, 778.043051296225))
        make_face()
        with BuildLine():
            Line((-435.961407875191, 536.1973873967519), (-420.87725460724124, 541.1455128184643))
            ThreePointArc((-420.87725460724124, 541.1455128184643), (-417.83644625337, 547.1551964253636), (-423.8461298602691, 550.1960047792348))
            Line((-423.8461298602691, 550.1960047792348), (-438.93028312821866, 545.2478793575218))
            ThreePointArc((-438.93028312821866, 545.2478793575218), (-441.9710914820897, 539.2381957506229), (-435.961407875191, 536.1973873967519))
        make_face()
        with BuildLine():
            Line((-475.40204242747944, 561.6863044207033), (-502.9713000914331, 645.7300326297446))
            ThreePointArc((-502.9713000914331, 645.7300326297446), (-510.9842115672985, 649.7844437682393), (-515.038622705793, 641.7715322923741))
            Line((-515.038622705793, 641.7715322923741), (-487.4693650418391, 557.7278040833331))
            ThreePointArc((-487.4693650418391, 557.7278040833331), (-479.4564535659742, 553.6733929448383), (-475.40204242747944, 561.6863044207033))
        make_face()
    extrude(amount=-CUT_EXTRUDE1_DEPTH, mode=Mode.SUBTRACT)

    # Fillet2
    fillet2_edges = [part.edges().sort_by_distance(p)[0] for p in [
        (-417.83644625337, 547.1551964253636, 6.35),
        (-441.97109148208983, 539.2381957506232, 6.35),
        (-522.859712579409, 685.9864116113188, 6.35),
        (-554.3874705807328, 782.0974624347198, 6.35),
        (-510.9842115672983, 649.7844437682394, 6.35),
        (-479.45645356597436, 553.6733929448382, 6.35),
        (-508.60146461760894, 823.8485563726842, 6.35),
        (-532.7361098463288, 815.9315556979437, 6.35),
    ]]
    fillet(fillet2_edges, radius=FILLET2_R)

    # CSK for #8 Flat Head Machine Screw (100)2
    with Locations(Plane(origin=(322.2568407232823, -320.70700445811474, 0), x_dir=(-0.9977564584489056, 0.06694811142592035, 0), z_dir=(0, 0, -1))):
        with Locations((876.906978493, 992.672305446), (833.265235439, 884.655200952), (904.92137181, 1028.108129087), (833.558815764, 851.479604792)):
            CounterSinkHole(CSK_FOR_8_FLAT_HEAD_MACHINE_SCREW_100_D / 2, CSK_FOR_8_FLAT_HEAD_MACHINE_SCREW_100_CSINK_D / 2, depth=CSK_FOR_8_FLAT_HEAD_MACHINE_SCREW_100_DEPTH, counter_sink_angle=CSK_FOR_8_FLAT_HEAD_MACHINE_SCREW_100_CSINK_ANGLE)
            with Locations((0, 0, -(CSK_FOR_8_FLAT_HEAD_MACHINE_SCREW_100_DEPTH + CSK_FOR_8_FLAT_HEAD_MACHINE_SCREW_100_TIP / 2))):  # 118° drill point
                Cone(0, CSK_FOR_8_FLAT_HEAD_MACHINE_SCREW_100_D / 2, CSK_FOR_8_FLAT_HEAD_MACHINE_SCREW_100_TIP, mode=Mode.SUBTRACT)


solid = part.part
